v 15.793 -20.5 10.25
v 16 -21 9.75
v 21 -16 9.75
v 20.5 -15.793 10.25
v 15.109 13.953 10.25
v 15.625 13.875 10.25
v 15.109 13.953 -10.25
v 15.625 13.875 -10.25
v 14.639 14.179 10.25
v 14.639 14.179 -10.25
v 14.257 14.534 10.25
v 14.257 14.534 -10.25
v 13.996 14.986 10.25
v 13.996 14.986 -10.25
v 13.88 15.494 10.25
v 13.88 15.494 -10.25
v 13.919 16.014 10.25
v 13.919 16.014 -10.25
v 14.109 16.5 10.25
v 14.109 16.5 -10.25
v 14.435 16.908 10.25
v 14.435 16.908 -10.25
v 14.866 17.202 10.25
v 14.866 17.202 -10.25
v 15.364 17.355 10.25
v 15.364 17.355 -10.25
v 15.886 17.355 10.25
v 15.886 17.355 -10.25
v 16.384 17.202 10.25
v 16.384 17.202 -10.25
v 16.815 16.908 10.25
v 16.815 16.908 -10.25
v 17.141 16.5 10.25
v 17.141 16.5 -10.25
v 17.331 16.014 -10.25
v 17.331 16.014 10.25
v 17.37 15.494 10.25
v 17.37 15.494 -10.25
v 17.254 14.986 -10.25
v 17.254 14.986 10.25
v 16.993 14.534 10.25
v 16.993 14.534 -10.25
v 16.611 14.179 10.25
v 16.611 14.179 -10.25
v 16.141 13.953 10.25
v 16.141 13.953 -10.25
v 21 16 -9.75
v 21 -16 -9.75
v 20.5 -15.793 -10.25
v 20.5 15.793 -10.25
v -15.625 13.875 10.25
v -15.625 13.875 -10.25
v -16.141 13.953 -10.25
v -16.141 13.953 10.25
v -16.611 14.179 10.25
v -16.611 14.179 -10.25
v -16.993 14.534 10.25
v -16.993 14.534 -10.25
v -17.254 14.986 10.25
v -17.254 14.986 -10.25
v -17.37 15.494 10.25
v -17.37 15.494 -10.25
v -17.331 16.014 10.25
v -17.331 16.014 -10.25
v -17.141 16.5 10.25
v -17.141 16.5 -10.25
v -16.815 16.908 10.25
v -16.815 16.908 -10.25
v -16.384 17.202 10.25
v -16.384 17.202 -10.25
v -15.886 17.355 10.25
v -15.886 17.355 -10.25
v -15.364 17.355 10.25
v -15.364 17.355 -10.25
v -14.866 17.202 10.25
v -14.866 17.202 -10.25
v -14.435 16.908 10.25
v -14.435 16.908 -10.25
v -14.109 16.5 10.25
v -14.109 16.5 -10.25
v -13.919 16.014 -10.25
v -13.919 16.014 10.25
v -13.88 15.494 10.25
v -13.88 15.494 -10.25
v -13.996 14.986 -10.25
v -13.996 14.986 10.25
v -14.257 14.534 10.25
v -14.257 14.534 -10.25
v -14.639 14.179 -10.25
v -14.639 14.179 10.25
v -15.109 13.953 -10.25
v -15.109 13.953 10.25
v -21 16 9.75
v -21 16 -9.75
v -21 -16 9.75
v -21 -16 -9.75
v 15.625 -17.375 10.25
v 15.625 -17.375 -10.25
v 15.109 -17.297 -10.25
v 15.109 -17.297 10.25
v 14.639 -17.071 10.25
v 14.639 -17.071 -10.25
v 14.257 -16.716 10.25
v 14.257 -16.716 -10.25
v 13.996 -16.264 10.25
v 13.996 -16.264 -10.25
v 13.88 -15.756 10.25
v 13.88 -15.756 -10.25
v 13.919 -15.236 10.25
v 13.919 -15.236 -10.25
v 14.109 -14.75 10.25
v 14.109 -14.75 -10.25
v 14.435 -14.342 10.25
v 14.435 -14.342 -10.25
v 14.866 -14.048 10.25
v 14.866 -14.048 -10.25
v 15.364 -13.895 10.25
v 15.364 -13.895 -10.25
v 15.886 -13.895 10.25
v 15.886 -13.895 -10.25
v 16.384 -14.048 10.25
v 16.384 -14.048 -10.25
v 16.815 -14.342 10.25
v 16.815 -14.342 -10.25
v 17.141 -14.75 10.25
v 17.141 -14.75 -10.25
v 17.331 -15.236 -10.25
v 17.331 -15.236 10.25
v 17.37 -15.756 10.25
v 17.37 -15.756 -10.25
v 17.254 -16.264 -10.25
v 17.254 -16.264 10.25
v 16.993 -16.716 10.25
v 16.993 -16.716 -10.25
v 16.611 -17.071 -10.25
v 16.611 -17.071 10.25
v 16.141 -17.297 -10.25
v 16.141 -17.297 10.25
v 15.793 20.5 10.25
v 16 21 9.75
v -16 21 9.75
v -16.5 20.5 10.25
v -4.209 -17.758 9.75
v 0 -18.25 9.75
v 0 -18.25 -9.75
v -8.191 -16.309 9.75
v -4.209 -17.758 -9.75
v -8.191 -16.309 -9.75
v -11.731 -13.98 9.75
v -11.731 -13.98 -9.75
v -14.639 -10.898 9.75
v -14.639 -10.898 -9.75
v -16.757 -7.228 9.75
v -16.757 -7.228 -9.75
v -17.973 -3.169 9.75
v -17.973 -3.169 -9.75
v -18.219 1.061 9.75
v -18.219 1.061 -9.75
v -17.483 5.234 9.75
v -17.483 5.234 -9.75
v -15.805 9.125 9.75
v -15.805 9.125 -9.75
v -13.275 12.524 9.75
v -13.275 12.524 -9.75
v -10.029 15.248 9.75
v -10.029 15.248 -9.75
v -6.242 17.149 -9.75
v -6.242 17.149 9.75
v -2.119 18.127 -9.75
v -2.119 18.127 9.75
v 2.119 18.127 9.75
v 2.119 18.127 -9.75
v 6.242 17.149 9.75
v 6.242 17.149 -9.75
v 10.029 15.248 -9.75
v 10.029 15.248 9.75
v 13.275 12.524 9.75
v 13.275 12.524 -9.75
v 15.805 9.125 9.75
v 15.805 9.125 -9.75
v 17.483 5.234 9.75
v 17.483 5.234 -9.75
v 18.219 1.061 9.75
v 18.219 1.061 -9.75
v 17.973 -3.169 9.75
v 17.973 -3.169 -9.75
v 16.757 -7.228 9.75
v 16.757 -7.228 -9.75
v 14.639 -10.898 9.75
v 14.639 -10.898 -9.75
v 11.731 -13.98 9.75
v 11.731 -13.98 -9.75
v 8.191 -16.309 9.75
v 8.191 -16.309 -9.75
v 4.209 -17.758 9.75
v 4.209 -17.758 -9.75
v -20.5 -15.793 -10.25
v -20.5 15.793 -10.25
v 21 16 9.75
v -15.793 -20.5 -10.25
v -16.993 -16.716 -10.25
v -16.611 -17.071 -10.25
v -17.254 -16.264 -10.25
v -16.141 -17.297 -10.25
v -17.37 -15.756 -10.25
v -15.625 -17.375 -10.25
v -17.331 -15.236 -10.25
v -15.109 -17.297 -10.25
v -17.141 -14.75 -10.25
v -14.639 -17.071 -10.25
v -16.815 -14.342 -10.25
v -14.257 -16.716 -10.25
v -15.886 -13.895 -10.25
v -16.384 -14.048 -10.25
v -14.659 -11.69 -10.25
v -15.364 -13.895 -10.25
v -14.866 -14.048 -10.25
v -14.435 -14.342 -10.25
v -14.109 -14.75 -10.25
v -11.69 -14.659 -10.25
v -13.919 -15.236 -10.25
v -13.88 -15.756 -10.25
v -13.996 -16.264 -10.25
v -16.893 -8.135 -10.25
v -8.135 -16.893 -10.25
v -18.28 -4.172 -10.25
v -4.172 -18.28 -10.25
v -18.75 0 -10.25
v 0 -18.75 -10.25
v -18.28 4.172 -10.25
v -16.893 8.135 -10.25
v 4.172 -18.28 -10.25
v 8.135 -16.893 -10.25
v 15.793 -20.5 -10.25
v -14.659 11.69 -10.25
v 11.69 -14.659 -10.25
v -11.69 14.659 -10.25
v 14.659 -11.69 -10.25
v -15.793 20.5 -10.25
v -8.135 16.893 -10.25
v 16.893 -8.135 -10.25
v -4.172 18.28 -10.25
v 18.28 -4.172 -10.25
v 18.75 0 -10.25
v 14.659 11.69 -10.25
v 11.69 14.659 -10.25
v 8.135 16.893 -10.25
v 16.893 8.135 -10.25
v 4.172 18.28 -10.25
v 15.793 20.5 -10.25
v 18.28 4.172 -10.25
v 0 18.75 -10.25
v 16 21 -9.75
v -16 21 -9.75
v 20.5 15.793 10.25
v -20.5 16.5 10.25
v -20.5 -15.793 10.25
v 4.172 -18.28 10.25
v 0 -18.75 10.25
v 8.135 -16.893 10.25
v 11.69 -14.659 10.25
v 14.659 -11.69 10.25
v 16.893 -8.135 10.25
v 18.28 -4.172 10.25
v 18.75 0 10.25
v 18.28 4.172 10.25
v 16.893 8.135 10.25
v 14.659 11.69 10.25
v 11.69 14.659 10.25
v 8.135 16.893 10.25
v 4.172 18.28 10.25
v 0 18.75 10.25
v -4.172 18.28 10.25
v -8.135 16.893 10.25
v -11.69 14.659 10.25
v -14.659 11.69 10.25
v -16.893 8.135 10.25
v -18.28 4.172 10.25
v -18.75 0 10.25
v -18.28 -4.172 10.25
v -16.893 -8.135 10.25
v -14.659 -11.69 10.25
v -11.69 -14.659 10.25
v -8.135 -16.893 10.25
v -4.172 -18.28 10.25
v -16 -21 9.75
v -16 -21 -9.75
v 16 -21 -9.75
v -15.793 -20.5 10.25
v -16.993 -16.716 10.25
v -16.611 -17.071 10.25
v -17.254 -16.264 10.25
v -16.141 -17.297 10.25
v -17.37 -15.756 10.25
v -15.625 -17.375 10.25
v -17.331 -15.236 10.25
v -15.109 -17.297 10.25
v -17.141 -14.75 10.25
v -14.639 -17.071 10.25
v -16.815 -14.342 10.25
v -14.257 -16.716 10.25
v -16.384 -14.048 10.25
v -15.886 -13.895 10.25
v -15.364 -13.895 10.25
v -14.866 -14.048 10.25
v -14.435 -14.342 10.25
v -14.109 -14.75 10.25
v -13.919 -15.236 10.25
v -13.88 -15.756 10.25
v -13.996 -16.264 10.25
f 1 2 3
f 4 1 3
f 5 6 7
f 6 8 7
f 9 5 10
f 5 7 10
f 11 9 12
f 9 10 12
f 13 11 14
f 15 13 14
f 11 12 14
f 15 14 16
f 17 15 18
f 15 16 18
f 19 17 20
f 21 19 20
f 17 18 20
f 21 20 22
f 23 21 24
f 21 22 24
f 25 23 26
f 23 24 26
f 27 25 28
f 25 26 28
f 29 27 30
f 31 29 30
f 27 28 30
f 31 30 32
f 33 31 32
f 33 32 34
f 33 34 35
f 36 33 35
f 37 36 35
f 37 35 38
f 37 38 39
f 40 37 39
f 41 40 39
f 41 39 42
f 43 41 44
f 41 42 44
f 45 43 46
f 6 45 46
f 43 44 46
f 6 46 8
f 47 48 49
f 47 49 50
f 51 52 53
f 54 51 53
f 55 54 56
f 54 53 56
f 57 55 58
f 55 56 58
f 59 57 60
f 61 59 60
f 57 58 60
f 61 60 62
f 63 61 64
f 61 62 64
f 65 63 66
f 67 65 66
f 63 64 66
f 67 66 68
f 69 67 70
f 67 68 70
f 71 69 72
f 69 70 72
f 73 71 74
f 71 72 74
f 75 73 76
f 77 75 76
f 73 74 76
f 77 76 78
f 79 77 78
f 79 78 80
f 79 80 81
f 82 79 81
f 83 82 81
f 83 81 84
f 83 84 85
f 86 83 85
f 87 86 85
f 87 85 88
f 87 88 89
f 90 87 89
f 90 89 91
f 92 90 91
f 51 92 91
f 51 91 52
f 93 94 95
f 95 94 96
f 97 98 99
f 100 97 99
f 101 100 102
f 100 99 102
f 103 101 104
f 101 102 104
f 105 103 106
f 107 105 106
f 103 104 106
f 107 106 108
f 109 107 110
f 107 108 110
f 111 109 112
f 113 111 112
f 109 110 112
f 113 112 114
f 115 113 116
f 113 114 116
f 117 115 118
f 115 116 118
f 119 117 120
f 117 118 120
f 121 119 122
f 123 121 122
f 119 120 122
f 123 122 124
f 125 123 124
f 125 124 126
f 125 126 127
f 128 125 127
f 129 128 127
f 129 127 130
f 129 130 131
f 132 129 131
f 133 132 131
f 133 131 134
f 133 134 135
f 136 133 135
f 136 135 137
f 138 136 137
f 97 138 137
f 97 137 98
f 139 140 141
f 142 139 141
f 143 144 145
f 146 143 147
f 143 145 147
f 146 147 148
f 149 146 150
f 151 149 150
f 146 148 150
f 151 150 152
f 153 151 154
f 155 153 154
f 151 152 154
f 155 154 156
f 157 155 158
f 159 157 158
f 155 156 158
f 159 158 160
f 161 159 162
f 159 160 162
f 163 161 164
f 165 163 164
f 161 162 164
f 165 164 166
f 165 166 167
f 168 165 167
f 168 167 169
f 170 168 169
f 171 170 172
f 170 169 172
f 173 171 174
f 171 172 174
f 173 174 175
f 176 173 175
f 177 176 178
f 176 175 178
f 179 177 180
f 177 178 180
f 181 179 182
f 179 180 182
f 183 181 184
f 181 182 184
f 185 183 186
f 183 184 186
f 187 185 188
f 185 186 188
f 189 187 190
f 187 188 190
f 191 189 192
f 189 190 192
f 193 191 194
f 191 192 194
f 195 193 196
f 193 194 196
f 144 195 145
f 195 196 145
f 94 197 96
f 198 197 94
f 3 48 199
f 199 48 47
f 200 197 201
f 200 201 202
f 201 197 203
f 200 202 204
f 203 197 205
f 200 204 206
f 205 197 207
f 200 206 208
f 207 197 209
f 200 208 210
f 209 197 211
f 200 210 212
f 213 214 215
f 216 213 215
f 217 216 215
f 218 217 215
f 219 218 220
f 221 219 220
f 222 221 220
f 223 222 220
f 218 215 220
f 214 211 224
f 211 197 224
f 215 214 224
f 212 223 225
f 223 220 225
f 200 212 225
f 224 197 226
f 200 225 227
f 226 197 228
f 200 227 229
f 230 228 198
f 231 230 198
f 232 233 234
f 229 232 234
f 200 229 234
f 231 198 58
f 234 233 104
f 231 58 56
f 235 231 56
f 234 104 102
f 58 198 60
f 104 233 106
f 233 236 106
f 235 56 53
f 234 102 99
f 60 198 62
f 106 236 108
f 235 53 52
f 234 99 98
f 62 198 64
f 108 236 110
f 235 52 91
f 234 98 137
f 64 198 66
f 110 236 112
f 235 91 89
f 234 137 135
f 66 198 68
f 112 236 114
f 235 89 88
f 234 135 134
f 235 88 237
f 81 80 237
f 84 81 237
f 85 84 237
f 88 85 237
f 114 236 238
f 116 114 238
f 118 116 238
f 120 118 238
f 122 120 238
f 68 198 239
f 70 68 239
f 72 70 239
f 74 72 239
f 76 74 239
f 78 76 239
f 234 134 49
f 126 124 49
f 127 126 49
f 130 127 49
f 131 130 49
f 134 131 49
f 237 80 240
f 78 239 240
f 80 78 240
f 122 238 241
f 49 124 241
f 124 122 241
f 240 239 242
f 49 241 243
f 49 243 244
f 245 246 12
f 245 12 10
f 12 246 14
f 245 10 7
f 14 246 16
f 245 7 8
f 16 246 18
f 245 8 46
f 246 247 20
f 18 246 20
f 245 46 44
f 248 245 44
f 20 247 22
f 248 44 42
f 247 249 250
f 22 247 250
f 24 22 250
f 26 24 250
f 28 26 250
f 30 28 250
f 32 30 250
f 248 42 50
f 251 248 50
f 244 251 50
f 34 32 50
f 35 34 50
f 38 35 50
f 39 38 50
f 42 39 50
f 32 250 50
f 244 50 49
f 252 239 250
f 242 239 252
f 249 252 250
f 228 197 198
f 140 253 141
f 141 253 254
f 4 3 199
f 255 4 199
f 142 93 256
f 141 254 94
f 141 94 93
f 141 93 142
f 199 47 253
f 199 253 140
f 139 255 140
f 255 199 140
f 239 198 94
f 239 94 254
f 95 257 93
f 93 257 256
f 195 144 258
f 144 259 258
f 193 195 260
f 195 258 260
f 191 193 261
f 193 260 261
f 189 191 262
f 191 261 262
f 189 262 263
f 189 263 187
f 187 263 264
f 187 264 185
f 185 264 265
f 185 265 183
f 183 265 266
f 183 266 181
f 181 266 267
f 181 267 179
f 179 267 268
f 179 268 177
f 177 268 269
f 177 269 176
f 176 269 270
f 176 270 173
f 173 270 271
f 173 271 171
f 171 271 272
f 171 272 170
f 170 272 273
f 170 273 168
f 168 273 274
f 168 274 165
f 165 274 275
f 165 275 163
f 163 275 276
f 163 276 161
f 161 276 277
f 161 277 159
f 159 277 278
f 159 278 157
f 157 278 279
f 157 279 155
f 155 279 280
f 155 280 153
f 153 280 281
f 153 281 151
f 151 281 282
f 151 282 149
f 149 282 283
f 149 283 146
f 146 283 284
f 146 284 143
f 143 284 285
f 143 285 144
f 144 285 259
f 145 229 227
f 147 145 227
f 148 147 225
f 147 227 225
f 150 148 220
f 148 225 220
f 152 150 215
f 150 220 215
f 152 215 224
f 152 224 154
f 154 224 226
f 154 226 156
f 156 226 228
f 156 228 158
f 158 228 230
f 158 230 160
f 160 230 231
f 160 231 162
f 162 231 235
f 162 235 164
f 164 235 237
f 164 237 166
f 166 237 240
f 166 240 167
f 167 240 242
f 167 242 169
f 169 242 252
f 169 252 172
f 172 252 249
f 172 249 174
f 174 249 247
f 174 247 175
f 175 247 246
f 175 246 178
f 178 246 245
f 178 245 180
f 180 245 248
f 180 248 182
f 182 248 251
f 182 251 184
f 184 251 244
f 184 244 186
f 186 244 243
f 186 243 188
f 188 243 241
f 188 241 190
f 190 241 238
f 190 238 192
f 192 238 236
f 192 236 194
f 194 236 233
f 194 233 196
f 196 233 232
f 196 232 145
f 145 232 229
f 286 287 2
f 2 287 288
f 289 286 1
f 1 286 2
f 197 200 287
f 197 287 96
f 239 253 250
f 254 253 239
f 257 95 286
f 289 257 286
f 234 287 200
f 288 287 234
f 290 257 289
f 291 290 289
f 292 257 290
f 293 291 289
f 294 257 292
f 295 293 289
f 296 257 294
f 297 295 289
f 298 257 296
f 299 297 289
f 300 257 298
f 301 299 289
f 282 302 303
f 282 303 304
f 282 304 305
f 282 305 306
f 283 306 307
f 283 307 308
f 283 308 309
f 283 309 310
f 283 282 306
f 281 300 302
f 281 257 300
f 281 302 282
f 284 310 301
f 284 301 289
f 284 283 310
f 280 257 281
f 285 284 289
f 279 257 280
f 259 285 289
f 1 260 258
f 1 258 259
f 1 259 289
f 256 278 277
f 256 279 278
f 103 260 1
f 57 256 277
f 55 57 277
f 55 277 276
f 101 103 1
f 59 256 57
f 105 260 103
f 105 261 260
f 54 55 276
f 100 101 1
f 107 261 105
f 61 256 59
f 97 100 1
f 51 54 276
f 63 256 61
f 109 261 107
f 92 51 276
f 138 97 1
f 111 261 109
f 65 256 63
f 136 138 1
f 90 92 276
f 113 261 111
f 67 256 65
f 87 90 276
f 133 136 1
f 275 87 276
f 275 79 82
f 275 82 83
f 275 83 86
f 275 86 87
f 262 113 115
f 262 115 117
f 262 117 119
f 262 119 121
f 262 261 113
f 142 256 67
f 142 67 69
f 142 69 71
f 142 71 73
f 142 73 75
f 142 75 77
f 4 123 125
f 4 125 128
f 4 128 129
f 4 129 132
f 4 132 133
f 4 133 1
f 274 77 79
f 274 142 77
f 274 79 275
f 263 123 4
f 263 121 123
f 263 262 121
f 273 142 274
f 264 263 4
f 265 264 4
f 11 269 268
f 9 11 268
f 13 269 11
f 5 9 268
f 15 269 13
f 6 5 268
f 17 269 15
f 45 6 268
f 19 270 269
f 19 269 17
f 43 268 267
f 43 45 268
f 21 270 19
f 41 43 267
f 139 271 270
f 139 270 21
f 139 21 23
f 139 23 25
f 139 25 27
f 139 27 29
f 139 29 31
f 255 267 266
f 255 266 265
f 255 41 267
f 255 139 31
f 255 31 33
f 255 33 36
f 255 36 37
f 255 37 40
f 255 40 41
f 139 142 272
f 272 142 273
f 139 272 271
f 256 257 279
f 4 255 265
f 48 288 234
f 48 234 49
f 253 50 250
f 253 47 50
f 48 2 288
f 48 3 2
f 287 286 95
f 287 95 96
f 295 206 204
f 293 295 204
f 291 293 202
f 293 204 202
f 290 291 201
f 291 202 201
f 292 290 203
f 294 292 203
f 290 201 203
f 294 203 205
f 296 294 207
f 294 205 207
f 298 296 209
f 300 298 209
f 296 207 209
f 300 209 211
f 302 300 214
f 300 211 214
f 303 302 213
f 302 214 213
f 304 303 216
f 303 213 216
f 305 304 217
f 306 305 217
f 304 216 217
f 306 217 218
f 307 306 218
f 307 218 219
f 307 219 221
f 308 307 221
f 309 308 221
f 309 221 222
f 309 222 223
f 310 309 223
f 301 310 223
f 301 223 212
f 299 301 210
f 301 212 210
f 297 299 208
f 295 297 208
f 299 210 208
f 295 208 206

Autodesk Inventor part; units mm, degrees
ref_plane "YZ Plane" through (0, 0, 0) normal (1, 0, 0) x (0, 1, 0)
ref_plane "XZ Plane" through (0, 0, 0) normal (0, 1, 0) x (-1, 0, 0)
ref_plane "XY Plane" through (0, 0, 0) normal (0, 0, 1) x (1, 0, 0)
sketch "Esquisse1" plane through (0, 0, 0) normal (0, 0, 1) x (1, 0, 0)
  line L0 (-21, -21) -> (21, -21)
  line L1 (21, -21) -> (21, 21)
  line L2 (21, 21) -> (-21, 21)
  line L3 (-21, 21) -> (-21, -21)
  line L4 (-21, -21) -> (21, 21) construction
  line L5 (21, -21) -> (-21, 21) construction
  point P0 (0, 0)
  dimension "d0" = 42
  dimension "d1" = 42
extrude "Extrusion1" add sketch "Esquisse1" along normal mid plane 20.5
sketch "Esquisse2" plane through (0, 0, 10.25) normal (0, 0, 1) x (1, 0, 0)
  point P0 (0, 0)
  point P1 (0, 0)
hole "Perçage1" at (0, 0, 10.25) direction (0, 0, -1) diameter 36.5 end through all
sketch "Esquisse3" plane through (0, 0, 10.25) normal (0, 0, 1) x (1, 0, 0)
  point P0 (0, 0)
  point P1 (-15.625, 15.625)
  point P2 (-15.625, -15.625)
  point P3 (15.625, -15.625)
  point P4 (15.625, 15.625)
  dimension "d11" = 31.25
  dimension "d12" = 31.25
  dimension "d13" = 15.625
  dimension "d14" = 15.625
hole "Perçage2" at (-15.625, 15.625, 10.25) at (-15.625, -15.625, 10.25) at (15.625, -15.625, 10.25) at (15.625, 15.625, 10.25) direction (0, 0, -1) diameter 3.5 end through all
chamfer "Chanfrein1" distance 5 angle 45 4 edges at (21, 21, 0) (-21, 21, 0) (21, -21, 0) (-21, -21, 0)
chamfer "Chanfrein2" distance 0.5 angle 45 17 edges at (-21, 0, 10.25) (-18.5, -18.5, 10.25) (0, -21, 10.25) (18.5, -18.5, 10.25) (21, 0, 10.25) (18.5, 18.5, 10.25) (0, 21, 10.25) (0, 18.25, 10.25) (-18.5, 18.5, -10.25) (0, 21, -10.25) (0, 18.25, -10.25) (-21, 0, -10.25) (0, -21, -10.25) (-18.5, -18.5, -10.25) (18.5, -18.5, -10.25) (21, 0, -10.25) (18.5, 18.5, -10.25)
equation "\"d12\" = d11"
equation "\"d13\" = 0.5 * d11"
equation "\"d14\" = 0.5 * d12"
properties part number "Cache reducteur" material "----------"
